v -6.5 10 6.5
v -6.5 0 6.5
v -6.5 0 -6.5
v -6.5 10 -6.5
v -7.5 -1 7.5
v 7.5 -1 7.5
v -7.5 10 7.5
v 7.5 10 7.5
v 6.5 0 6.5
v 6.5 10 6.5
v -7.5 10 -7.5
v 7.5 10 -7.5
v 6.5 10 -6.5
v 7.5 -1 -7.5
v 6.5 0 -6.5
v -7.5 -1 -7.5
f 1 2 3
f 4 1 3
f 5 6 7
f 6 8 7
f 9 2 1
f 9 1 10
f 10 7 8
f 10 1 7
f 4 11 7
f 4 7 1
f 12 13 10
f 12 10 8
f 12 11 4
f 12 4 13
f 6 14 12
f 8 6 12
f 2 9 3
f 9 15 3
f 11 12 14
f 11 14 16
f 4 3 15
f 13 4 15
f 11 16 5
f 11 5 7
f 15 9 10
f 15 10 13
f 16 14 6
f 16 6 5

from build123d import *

# Parameters (mm, degrees)
SKETCH5_W           = 15
SKETCH5_H           = 15
SKETCH5_W_2         = 13
SKETCH5_H_2         = 13
BOSS_EXTRUDE1_DEPTH = 10
SKETCH6_W           = 15
SKETCH6_H           = 1
BOSS_EXTRUDE2_DEPTH = 15


with BuildPart() as part:
    # Sketch5 → Boss-Extrude1 (new body)
    with BuildSketch(Plane(origin=(0, 0, 0), x_dir=(1, 0, 0), z_dir=(0, 1, 0))):
        Rectangle(SKETCH5_W, SKETCH5_H)
        Rectangle(SKETCH5_W_2, SKETCH5_H_2, mode=Mode.SUBTRACT)
    extrude(amount=BOSS_EXTRUDE1_DEPTH)

    # Sketch6 → Boss-Extrude2 (add)
    with BuildSketch(Plane(origin=(0, 0, -7.5), x_dir=(-1, 0, 0), z_dir=(0, 0, -1))):
        with Locations((0, -0.5)):
            Rectangle(SKETCH6_W, SKETCH6_H)
    extrude(amount=-BOSS_EXTRUDE2_DEPTH)


solid = part.part
